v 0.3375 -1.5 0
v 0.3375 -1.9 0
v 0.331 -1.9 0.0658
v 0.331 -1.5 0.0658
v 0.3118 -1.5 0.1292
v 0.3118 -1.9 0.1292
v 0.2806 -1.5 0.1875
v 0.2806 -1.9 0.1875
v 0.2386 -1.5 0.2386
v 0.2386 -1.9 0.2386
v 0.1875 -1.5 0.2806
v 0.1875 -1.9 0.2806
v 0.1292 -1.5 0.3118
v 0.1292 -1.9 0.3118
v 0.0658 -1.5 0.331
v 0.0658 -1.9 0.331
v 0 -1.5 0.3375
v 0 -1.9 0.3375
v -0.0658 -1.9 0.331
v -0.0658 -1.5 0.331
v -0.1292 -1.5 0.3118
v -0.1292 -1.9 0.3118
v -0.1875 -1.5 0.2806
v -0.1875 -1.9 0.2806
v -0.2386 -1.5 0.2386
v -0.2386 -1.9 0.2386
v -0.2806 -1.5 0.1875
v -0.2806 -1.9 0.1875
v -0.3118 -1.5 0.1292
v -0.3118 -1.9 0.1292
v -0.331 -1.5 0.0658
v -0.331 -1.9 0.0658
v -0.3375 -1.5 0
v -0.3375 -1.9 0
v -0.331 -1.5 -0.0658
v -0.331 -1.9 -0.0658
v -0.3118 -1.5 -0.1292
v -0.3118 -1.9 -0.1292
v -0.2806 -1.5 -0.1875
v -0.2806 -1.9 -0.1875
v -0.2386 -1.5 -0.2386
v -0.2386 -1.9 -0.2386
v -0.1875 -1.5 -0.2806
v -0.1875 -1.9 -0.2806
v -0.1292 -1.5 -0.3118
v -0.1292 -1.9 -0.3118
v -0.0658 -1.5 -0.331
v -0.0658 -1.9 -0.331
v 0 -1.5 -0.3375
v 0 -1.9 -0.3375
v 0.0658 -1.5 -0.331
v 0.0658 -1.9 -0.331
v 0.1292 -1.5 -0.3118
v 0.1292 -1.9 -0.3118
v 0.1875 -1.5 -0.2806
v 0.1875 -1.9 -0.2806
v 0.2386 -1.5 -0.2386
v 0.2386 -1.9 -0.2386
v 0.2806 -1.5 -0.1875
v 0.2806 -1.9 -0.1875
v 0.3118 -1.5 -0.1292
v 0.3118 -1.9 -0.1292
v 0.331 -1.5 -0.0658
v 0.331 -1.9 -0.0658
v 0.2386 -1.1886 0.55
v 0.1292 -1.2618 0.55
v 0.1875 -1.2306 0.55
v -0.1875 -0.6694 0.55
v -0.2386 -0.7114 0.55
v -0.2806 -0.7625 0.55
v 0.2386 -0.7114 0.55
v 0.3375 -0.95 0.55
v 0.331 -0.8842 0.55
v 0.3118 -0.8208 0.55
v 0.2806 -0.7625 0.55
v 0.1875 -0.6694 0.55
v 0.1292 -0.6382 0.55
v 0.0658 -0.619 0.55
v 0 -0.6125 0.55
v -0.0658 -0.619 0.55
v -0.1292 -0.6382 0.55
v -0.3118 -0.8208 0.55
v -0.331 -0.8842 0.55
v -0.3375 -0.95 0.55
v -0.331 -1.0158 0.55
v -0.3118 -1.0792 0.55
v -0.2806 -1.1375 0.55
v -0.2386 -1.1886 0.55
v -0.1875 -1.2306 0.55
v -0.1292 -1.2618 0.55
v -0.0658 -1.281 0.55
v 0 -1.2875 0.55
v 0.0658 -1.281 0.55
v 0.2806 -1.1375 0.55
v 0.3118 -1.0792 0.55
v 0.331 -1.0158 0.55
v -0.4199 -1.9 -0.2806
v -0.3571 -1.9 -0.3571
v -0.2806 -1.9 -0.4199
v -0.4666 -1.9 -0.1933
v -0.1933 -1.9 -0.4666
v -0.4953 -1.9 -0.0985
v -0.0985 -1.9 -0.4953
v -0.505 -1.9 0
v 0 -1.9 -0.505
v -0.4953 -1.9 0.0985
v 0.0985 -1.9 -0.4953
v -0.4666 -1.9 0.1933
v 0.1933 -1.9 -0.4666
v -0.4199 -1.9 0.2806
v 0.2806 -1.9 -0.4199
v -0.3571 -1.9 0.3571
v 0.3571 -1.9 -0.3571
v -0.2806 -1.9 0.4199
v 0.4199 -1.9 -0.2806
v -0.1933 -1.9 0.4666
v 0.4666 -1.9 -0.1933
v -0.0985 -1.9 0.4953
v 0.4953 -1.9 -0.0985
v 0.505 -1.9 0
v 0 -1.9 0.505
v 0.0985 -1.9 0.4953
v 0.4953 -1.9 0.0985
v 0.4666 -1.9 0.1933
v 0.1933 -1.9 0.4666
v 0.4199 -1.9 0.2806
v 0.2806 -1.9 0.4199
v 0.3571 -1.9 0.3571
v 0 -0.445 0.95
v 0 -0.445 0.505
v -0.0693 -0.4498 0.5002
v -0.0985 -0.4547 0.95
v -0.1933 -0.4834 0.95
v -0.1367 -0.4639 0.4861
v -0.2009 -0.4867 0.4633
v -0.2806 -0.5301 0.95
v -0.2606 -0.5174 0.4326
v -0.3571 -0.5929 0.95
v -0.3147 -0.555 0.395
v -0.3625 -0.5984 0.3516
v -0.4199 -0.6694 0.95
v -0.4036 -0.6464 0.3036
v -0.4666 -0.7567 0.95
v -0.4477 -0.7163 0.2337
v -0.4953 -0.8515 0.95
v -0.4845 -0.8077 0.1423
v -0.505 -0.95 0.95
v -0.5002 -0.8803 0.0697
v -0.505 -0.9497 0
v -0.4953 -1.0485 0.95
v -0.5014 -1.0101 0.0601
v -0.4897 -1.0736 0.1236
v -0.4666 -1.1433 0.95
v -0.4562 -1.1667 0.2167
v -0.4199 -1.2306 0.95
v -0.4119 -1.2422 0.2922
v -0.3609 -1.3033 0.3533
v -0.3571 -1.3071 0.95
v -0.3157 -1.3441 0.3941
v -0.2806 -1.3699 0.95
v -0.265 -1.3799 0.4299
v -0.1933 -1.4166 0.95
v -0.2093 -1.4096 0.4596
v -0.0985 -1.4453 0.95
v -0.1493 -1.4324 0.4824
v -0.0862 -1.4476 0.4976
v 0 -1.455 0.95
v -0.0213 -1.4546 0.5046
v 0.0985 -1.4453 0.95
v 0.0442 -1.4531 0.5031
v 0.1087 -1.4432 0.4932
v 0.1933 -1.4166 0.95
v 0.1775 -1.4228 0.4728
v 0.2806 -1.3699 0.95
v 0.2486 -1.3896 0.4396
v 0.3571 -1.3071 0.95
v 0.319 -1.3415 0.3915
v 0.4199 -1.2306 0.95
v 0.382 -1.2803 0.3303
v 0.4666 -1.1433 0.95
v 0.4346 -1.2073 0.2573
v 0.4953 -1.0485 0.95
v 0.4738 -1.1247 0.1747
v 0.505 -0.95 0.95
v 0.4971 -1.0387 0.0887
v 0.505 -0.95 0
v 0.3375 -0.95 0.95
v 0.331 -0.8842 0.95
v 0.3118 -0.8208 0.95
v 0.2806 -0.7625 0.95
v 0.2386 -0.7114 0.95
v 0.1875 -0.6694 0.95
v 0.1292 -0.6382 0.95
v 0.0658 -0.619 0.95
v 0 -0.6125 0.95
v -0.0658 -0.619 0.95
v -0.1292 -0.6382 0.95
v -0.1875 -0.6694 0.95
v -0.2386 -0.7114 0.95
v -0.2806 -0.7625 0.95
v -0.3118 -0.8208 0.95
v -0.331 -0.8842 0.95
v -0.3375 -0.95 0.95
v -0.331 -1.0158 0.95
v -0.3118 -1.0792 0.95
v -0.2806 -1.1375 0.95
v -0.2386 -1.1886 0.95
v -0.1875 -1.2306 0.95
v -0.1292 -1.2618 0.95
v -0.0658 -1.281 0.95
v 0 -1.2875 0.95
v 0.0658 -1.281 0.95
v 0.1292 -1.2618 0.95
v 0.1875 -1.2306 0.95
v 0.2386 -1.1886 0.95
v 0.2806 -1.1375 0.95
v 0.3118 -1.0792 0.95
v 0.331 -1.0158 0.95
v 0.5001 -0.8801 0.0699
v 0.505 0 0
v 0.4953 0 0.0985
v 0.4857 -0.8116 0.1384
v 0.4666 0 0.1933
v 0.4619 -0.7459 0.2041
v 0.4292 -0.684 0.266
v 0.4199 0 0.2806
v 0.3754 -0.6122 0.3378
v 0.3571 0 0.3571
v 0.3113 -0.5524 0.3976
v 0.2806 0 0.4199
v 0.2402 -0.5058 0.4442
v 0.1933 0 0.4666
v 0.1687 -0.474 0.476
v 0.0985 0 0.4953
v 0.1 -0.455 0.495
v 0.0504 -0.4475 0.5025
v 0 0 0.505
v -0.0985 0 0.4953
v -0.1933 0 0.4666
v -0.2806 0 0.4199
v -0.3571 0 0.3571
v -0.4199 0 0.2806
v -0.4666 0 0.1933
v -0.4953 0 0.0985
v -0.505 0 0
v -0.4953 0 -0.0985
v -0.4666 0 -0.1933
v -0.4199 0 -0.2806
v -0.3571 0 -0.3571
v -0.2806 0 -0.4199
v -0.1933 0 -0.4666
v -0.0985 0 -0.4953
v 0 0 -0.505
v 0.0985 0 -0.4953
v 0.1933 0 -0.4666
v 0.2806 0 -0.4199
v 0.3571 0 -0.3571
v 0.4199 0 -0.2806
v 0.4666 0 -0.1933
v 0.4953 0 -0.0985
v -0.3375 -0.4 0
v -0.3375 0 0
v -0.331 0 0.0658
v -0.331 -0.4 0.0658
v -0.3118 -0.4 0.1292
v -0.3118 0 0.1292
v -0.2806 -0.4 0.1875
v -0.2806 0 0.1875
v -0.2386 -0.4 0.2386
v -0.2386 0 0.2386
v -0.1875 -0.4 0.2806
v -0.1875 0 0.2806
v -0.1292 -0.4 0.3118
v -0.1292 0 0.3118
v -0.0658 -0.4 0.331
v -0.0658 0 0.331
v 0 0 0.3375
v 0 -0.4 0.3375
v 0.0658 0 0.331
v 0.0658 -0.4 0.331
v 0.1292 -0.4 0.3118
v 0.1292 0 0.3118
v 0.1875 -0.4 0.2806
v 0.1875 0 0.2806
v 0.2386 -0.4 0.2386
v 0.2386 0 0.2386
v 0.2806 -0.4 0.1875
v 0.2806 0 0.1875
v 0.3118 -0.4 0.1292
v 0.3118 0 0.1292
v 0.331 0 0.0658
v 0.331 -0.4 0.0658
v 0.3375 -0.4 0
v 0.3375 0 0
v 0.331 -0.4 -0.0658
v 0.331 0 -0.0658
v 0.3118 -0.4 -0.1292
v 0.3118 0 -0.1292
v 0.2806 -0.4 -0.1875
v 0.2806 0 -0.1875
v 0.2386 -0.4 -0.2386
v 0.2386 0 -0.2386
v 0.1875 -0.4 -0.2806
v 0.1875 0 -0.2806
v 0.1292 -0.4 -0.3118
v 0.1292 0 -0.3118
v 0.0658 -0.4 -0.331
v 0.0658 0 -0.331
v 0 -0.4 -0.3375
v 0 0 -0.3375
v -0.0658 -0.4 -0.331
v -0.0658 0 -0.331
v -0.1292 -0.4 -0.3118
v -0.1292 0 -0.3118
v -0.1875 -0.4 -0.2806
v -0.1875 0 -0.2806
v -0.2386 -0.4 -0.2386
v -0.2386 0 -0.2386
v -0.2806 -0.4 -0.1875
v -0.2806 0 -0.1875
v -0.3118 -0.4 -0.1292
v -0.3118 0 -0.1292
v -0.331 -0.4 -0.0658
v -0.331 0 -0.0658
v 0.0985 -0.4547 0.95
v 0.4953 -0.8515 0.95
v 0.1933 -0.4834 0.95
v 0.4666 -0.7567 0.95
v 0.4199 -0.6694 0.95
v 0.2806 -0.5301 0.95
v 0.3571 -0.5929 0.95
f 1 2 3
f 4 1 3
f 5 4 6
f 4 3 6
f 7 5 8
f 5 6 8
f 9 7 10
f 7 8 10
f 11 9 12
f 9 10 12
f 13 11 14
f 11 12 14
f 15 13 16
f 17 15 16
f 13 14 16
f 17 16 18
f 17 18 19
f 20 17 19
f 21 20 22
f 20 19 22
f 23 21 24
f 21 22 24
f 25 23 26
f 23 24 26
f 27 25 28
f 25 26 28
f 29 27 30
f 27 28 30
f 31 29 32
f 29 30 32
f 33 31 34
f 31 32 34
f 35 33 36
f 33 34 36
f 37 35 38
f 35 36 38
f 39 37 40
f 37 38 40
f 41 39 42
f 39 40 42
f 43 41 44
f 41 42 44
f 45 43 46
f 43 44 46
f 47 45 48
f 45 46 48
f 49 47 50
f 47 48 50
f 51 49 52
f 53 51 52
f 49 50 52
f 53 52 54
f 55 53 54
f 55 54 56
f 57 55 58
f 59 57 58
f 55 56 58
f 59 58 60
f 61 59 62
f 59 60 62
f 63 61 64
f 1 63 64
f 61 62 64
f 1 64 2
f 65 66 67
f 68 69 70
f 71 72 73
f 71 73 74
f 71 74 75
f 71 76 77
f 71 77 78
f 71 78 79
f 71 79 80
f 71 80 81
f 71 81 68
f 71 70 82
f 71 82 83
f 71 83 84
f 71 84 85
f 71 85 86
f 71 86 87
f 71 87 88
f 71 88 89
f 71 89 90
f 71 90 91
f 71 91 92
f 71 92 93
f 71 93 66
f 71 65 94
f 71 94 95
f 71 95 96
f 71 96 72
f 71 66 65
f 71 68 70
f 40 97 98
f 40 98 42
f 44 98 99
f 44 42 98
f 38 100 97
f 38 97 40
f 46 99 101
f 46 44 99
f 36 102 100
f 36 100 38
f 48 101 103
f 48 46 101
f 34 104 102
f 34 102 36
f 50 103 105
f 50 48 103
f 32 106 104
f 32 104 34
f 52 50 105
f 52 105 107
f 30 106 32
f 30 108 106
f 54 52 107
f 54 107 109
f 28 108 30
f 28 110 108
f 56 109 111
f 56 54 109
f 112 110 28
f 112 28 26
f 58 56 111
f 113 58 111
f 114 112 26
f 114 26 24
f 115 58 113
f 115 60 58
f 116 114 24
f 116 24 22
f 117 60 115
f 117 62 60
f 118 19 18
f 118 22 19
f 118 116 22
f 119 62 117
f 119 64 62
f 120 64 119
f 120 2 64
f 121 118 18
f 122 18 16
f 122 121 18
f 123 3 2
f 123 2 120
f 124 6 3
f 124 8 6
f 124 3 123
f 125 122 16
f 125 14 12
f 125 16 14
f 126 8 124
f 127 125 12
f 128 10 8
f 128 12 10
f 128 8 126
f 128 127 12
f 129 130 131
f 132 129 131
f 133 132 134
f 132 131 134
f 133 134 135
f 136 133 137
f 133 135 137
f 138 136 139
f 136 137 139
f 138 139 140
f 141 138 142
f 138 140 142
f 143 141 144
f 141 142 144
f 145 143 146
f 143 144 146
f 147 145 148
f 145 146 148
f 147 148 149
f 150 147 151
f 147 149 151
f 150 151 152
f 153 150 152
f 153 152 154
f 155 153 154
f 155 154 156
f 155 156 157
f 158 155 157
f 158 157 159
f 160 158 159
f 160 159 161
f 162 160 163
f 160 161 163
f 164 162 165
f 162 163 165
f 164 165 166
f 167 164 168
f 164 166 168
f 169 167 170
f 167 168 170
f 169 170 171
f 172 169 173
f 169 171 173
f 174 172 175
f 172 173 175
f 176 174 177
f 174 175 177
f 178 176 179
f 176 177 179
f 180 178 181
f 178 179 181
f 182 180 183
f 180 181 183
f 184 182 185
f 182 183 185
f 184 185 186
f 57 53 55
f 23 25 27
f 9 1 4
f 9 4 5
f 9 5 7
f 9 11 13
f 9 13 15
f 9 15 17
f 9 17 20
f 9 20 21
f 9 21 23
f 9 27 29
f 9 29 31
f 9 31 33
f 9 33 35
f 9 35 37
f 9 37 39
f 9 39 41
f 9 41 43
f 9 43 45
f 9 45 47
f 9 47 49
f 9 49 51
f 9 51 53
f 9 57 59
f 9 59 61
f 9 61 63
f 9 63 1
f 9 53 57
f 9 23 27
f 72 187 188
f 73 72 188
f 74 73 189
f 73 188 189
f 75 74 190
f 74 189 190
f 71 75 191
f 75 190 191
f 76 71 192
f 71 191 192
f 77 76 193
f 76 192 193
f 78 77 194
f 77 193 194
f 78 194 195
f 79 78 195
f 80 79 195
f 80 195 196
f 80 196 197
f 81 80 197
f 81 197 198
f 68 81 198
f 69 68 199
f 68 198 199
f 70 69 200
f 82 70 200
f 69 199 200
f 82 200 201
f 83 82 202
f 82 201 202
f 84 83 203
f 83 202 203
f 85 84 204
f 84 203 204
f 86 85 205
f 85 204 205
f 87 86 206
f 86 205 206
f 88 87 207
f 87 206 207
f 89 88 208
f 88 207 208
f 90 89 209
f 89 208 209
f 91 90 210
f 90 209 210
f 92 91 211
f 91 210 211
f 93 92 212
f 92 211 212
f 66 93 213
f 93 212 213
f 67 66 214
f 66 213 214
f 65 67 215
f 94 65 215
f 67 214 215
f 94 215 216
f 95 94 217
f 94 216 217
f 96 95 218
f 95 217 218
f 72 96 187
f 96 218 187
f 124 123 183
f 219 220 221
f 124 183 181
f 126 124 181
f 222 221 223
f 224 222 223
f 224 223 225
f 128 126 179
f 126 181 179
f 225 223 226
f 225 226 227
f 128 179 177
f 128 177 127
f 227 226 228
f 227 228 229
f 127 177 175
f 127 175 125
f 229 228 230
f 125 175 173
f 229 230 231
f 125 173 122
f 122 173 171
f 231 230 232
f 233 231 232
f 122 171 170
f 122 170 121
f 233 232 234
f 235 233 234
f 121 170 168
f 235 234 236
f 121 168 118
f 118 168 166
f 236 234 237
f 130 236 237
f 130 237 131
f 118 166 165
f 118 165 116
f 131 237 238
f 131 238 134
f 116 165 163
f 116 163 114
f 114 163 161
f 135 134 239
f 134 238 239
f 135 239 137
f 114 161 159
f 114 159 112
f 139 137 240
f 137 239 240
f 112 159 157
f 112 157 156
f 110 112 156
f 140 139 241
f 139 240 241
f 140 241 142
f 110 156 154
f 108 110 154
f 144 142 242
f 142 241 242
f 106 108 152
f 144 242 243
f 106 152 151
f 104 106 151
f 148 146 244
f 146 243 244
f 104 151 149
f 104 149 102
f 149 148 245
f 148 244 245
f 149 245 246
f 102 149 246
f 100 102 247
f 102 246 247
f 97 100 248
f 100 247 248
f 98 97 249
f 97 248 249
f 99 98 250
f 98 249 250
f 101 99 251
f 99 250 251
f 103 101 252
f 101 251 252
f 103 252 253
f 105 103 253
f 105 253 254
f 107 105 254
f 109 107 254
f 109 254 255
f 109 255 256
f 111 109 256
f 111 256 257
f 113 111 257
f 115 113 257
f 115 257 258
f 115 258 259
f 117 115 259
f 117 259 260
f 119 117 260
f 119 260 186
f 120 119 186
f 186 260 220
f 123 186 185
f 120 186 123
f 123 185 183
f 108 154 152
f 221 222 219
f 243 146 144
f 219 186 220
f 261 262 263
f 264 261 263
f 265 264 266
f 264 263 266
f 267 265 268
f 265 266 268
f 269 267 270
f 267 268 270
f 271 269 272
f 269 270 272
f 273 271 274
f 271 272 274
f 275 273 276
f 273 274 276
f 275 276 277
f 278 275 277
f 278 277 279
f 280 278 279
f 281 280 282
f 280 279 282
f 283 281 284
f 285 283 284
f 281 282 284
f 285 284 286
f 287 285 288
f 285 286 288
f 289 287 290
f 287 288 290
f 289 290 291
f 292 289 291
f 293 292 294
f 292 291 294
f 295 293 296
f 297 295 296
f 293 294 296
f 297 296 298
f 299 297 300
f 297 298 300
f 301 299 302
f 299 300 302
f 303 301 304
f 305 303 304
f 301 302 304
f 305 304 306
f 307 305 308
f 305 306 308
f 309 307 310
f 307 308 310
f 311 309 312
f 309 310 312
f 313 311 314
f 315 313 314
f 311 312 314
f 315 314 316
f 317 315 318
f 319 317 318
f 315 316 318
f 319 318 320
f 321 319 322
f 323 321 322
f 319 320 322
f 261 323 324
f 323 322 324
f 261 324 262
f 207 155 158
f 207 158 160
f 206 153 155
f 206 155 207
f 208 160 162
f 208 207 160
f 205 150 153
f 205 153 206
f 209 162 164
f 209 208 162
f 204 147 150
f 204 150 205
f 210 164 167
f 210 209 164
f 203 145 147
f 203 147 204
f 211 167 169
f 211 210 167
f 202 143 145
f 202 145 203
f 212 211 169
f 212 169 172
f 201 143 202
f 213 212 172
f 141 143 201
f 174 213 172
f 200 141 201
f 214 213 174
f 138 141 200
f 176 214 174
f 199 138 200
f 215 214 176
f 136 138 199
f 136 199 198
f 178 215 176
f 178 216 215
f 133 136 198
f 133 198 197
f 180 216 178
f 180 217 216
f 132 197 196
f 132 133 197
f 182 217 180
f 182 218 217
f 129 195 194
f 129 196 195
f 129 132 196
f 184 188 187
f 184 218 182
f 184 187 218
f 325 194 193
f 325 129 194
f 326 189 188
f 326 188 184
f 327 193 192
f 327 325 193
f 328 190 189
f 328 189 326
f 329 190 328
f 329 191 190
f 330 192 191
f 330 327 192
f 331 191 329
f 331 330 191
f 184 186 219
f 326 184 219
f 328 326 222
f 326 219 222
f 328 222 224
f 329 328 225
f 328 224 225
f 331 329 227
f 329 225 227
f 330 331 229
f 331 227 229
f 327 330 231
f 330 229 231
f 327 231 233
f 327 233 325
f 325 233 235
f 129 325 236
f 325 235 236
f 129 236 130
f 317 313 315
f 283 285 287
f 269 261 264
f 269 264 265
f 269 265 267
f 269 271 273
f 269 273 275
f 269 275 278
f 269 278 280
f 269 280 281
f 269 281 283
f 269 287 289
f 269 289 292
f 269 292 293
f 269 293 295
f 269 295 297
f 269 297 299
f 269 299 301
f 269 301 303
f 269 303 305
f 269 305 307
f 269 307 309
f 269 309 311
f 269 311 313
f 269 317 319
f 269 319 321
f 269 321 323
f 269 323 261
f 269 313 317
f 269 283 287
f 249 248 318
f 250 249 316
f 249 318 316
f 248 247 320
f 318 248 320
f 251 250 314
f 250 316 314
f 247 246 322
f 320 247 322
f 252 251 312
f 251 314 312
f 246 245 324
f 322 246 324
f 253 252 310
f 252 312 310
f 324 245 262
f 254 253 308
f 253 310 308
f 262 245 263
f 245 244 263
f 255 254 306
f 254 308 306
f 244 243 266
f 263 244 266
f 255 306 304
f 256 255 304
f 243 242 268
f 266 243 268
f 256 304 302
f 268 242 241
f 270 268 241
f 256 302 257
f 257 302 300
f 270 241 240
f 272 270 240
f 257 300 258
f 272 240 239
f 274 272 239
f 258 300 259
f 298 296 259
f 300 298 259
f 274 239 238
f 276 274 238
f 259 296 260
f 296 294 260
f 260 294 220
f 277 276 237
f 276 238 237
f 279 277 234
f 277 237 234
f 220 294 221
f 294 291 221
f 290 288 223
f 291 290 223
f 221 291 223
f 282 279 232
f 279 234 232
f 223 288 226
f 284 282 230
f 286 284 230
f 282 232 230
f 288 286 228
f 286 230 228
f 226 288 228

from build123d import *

# Parameters (mm, degrees)
F0_R     = 0.505
F1_DEPTH = 1.9
F3_DEPTH = 0.95
F4_R     = 0.3375
F5_DEPTH = 0.4
F6_R     = 0.3375
F7_DEPTH = 0.4
F8_R     = 0.3375
F9_DEPTH = 0.4


with BuildPart() as f1:
    # F0 (on Front) → F1 (new body)
    with BuildSketch(Plane.XZ):
        Circle(F0_R)
    extrude(amount=F1_DEPTH)

    # F2 (on Top) → F3 (join)
    with BuildSketch(Plane.XY):
        with BuildLine():
            ThreePointArc((0, -0.445), (-0.357089, -1.307089), (0.505, -0.95))
            ThreePointArc((0.505, -0.95), (0.357089, -0.592911), (0, -0.445))
        make_face()
    extrude(amount=F3_DEPTH)

    # F4 (on face) → F5 (cut)
    with BuildSketch(Plane.XZ.offset(1.9)):
        Circle(F4_R)
    extrude(amount=-F5_DEPTH, mode=Mode.SUBTRACT)

    # F6 (on face) → F7 (cut)
    with BuildSketch(Plane.XY.offset(0.95)):
        with Locations((0, -0.95)):
            Circle(F6_R)
    extrude(amount=-F7_DEPTH, mode=Mode.SUBTRACT)

    # F8 (on face) → F9 (cut)
    with BuildSketch(Plane(origin=(0, 0, 0), x_dir=(-1, 0, 0), z_dir=(0, 1, 0))):
        Circle(F8_R)
    extrude(amount=-F9_DEPTH, mode=Mode.SUBTRACT)


solid = f1.part
